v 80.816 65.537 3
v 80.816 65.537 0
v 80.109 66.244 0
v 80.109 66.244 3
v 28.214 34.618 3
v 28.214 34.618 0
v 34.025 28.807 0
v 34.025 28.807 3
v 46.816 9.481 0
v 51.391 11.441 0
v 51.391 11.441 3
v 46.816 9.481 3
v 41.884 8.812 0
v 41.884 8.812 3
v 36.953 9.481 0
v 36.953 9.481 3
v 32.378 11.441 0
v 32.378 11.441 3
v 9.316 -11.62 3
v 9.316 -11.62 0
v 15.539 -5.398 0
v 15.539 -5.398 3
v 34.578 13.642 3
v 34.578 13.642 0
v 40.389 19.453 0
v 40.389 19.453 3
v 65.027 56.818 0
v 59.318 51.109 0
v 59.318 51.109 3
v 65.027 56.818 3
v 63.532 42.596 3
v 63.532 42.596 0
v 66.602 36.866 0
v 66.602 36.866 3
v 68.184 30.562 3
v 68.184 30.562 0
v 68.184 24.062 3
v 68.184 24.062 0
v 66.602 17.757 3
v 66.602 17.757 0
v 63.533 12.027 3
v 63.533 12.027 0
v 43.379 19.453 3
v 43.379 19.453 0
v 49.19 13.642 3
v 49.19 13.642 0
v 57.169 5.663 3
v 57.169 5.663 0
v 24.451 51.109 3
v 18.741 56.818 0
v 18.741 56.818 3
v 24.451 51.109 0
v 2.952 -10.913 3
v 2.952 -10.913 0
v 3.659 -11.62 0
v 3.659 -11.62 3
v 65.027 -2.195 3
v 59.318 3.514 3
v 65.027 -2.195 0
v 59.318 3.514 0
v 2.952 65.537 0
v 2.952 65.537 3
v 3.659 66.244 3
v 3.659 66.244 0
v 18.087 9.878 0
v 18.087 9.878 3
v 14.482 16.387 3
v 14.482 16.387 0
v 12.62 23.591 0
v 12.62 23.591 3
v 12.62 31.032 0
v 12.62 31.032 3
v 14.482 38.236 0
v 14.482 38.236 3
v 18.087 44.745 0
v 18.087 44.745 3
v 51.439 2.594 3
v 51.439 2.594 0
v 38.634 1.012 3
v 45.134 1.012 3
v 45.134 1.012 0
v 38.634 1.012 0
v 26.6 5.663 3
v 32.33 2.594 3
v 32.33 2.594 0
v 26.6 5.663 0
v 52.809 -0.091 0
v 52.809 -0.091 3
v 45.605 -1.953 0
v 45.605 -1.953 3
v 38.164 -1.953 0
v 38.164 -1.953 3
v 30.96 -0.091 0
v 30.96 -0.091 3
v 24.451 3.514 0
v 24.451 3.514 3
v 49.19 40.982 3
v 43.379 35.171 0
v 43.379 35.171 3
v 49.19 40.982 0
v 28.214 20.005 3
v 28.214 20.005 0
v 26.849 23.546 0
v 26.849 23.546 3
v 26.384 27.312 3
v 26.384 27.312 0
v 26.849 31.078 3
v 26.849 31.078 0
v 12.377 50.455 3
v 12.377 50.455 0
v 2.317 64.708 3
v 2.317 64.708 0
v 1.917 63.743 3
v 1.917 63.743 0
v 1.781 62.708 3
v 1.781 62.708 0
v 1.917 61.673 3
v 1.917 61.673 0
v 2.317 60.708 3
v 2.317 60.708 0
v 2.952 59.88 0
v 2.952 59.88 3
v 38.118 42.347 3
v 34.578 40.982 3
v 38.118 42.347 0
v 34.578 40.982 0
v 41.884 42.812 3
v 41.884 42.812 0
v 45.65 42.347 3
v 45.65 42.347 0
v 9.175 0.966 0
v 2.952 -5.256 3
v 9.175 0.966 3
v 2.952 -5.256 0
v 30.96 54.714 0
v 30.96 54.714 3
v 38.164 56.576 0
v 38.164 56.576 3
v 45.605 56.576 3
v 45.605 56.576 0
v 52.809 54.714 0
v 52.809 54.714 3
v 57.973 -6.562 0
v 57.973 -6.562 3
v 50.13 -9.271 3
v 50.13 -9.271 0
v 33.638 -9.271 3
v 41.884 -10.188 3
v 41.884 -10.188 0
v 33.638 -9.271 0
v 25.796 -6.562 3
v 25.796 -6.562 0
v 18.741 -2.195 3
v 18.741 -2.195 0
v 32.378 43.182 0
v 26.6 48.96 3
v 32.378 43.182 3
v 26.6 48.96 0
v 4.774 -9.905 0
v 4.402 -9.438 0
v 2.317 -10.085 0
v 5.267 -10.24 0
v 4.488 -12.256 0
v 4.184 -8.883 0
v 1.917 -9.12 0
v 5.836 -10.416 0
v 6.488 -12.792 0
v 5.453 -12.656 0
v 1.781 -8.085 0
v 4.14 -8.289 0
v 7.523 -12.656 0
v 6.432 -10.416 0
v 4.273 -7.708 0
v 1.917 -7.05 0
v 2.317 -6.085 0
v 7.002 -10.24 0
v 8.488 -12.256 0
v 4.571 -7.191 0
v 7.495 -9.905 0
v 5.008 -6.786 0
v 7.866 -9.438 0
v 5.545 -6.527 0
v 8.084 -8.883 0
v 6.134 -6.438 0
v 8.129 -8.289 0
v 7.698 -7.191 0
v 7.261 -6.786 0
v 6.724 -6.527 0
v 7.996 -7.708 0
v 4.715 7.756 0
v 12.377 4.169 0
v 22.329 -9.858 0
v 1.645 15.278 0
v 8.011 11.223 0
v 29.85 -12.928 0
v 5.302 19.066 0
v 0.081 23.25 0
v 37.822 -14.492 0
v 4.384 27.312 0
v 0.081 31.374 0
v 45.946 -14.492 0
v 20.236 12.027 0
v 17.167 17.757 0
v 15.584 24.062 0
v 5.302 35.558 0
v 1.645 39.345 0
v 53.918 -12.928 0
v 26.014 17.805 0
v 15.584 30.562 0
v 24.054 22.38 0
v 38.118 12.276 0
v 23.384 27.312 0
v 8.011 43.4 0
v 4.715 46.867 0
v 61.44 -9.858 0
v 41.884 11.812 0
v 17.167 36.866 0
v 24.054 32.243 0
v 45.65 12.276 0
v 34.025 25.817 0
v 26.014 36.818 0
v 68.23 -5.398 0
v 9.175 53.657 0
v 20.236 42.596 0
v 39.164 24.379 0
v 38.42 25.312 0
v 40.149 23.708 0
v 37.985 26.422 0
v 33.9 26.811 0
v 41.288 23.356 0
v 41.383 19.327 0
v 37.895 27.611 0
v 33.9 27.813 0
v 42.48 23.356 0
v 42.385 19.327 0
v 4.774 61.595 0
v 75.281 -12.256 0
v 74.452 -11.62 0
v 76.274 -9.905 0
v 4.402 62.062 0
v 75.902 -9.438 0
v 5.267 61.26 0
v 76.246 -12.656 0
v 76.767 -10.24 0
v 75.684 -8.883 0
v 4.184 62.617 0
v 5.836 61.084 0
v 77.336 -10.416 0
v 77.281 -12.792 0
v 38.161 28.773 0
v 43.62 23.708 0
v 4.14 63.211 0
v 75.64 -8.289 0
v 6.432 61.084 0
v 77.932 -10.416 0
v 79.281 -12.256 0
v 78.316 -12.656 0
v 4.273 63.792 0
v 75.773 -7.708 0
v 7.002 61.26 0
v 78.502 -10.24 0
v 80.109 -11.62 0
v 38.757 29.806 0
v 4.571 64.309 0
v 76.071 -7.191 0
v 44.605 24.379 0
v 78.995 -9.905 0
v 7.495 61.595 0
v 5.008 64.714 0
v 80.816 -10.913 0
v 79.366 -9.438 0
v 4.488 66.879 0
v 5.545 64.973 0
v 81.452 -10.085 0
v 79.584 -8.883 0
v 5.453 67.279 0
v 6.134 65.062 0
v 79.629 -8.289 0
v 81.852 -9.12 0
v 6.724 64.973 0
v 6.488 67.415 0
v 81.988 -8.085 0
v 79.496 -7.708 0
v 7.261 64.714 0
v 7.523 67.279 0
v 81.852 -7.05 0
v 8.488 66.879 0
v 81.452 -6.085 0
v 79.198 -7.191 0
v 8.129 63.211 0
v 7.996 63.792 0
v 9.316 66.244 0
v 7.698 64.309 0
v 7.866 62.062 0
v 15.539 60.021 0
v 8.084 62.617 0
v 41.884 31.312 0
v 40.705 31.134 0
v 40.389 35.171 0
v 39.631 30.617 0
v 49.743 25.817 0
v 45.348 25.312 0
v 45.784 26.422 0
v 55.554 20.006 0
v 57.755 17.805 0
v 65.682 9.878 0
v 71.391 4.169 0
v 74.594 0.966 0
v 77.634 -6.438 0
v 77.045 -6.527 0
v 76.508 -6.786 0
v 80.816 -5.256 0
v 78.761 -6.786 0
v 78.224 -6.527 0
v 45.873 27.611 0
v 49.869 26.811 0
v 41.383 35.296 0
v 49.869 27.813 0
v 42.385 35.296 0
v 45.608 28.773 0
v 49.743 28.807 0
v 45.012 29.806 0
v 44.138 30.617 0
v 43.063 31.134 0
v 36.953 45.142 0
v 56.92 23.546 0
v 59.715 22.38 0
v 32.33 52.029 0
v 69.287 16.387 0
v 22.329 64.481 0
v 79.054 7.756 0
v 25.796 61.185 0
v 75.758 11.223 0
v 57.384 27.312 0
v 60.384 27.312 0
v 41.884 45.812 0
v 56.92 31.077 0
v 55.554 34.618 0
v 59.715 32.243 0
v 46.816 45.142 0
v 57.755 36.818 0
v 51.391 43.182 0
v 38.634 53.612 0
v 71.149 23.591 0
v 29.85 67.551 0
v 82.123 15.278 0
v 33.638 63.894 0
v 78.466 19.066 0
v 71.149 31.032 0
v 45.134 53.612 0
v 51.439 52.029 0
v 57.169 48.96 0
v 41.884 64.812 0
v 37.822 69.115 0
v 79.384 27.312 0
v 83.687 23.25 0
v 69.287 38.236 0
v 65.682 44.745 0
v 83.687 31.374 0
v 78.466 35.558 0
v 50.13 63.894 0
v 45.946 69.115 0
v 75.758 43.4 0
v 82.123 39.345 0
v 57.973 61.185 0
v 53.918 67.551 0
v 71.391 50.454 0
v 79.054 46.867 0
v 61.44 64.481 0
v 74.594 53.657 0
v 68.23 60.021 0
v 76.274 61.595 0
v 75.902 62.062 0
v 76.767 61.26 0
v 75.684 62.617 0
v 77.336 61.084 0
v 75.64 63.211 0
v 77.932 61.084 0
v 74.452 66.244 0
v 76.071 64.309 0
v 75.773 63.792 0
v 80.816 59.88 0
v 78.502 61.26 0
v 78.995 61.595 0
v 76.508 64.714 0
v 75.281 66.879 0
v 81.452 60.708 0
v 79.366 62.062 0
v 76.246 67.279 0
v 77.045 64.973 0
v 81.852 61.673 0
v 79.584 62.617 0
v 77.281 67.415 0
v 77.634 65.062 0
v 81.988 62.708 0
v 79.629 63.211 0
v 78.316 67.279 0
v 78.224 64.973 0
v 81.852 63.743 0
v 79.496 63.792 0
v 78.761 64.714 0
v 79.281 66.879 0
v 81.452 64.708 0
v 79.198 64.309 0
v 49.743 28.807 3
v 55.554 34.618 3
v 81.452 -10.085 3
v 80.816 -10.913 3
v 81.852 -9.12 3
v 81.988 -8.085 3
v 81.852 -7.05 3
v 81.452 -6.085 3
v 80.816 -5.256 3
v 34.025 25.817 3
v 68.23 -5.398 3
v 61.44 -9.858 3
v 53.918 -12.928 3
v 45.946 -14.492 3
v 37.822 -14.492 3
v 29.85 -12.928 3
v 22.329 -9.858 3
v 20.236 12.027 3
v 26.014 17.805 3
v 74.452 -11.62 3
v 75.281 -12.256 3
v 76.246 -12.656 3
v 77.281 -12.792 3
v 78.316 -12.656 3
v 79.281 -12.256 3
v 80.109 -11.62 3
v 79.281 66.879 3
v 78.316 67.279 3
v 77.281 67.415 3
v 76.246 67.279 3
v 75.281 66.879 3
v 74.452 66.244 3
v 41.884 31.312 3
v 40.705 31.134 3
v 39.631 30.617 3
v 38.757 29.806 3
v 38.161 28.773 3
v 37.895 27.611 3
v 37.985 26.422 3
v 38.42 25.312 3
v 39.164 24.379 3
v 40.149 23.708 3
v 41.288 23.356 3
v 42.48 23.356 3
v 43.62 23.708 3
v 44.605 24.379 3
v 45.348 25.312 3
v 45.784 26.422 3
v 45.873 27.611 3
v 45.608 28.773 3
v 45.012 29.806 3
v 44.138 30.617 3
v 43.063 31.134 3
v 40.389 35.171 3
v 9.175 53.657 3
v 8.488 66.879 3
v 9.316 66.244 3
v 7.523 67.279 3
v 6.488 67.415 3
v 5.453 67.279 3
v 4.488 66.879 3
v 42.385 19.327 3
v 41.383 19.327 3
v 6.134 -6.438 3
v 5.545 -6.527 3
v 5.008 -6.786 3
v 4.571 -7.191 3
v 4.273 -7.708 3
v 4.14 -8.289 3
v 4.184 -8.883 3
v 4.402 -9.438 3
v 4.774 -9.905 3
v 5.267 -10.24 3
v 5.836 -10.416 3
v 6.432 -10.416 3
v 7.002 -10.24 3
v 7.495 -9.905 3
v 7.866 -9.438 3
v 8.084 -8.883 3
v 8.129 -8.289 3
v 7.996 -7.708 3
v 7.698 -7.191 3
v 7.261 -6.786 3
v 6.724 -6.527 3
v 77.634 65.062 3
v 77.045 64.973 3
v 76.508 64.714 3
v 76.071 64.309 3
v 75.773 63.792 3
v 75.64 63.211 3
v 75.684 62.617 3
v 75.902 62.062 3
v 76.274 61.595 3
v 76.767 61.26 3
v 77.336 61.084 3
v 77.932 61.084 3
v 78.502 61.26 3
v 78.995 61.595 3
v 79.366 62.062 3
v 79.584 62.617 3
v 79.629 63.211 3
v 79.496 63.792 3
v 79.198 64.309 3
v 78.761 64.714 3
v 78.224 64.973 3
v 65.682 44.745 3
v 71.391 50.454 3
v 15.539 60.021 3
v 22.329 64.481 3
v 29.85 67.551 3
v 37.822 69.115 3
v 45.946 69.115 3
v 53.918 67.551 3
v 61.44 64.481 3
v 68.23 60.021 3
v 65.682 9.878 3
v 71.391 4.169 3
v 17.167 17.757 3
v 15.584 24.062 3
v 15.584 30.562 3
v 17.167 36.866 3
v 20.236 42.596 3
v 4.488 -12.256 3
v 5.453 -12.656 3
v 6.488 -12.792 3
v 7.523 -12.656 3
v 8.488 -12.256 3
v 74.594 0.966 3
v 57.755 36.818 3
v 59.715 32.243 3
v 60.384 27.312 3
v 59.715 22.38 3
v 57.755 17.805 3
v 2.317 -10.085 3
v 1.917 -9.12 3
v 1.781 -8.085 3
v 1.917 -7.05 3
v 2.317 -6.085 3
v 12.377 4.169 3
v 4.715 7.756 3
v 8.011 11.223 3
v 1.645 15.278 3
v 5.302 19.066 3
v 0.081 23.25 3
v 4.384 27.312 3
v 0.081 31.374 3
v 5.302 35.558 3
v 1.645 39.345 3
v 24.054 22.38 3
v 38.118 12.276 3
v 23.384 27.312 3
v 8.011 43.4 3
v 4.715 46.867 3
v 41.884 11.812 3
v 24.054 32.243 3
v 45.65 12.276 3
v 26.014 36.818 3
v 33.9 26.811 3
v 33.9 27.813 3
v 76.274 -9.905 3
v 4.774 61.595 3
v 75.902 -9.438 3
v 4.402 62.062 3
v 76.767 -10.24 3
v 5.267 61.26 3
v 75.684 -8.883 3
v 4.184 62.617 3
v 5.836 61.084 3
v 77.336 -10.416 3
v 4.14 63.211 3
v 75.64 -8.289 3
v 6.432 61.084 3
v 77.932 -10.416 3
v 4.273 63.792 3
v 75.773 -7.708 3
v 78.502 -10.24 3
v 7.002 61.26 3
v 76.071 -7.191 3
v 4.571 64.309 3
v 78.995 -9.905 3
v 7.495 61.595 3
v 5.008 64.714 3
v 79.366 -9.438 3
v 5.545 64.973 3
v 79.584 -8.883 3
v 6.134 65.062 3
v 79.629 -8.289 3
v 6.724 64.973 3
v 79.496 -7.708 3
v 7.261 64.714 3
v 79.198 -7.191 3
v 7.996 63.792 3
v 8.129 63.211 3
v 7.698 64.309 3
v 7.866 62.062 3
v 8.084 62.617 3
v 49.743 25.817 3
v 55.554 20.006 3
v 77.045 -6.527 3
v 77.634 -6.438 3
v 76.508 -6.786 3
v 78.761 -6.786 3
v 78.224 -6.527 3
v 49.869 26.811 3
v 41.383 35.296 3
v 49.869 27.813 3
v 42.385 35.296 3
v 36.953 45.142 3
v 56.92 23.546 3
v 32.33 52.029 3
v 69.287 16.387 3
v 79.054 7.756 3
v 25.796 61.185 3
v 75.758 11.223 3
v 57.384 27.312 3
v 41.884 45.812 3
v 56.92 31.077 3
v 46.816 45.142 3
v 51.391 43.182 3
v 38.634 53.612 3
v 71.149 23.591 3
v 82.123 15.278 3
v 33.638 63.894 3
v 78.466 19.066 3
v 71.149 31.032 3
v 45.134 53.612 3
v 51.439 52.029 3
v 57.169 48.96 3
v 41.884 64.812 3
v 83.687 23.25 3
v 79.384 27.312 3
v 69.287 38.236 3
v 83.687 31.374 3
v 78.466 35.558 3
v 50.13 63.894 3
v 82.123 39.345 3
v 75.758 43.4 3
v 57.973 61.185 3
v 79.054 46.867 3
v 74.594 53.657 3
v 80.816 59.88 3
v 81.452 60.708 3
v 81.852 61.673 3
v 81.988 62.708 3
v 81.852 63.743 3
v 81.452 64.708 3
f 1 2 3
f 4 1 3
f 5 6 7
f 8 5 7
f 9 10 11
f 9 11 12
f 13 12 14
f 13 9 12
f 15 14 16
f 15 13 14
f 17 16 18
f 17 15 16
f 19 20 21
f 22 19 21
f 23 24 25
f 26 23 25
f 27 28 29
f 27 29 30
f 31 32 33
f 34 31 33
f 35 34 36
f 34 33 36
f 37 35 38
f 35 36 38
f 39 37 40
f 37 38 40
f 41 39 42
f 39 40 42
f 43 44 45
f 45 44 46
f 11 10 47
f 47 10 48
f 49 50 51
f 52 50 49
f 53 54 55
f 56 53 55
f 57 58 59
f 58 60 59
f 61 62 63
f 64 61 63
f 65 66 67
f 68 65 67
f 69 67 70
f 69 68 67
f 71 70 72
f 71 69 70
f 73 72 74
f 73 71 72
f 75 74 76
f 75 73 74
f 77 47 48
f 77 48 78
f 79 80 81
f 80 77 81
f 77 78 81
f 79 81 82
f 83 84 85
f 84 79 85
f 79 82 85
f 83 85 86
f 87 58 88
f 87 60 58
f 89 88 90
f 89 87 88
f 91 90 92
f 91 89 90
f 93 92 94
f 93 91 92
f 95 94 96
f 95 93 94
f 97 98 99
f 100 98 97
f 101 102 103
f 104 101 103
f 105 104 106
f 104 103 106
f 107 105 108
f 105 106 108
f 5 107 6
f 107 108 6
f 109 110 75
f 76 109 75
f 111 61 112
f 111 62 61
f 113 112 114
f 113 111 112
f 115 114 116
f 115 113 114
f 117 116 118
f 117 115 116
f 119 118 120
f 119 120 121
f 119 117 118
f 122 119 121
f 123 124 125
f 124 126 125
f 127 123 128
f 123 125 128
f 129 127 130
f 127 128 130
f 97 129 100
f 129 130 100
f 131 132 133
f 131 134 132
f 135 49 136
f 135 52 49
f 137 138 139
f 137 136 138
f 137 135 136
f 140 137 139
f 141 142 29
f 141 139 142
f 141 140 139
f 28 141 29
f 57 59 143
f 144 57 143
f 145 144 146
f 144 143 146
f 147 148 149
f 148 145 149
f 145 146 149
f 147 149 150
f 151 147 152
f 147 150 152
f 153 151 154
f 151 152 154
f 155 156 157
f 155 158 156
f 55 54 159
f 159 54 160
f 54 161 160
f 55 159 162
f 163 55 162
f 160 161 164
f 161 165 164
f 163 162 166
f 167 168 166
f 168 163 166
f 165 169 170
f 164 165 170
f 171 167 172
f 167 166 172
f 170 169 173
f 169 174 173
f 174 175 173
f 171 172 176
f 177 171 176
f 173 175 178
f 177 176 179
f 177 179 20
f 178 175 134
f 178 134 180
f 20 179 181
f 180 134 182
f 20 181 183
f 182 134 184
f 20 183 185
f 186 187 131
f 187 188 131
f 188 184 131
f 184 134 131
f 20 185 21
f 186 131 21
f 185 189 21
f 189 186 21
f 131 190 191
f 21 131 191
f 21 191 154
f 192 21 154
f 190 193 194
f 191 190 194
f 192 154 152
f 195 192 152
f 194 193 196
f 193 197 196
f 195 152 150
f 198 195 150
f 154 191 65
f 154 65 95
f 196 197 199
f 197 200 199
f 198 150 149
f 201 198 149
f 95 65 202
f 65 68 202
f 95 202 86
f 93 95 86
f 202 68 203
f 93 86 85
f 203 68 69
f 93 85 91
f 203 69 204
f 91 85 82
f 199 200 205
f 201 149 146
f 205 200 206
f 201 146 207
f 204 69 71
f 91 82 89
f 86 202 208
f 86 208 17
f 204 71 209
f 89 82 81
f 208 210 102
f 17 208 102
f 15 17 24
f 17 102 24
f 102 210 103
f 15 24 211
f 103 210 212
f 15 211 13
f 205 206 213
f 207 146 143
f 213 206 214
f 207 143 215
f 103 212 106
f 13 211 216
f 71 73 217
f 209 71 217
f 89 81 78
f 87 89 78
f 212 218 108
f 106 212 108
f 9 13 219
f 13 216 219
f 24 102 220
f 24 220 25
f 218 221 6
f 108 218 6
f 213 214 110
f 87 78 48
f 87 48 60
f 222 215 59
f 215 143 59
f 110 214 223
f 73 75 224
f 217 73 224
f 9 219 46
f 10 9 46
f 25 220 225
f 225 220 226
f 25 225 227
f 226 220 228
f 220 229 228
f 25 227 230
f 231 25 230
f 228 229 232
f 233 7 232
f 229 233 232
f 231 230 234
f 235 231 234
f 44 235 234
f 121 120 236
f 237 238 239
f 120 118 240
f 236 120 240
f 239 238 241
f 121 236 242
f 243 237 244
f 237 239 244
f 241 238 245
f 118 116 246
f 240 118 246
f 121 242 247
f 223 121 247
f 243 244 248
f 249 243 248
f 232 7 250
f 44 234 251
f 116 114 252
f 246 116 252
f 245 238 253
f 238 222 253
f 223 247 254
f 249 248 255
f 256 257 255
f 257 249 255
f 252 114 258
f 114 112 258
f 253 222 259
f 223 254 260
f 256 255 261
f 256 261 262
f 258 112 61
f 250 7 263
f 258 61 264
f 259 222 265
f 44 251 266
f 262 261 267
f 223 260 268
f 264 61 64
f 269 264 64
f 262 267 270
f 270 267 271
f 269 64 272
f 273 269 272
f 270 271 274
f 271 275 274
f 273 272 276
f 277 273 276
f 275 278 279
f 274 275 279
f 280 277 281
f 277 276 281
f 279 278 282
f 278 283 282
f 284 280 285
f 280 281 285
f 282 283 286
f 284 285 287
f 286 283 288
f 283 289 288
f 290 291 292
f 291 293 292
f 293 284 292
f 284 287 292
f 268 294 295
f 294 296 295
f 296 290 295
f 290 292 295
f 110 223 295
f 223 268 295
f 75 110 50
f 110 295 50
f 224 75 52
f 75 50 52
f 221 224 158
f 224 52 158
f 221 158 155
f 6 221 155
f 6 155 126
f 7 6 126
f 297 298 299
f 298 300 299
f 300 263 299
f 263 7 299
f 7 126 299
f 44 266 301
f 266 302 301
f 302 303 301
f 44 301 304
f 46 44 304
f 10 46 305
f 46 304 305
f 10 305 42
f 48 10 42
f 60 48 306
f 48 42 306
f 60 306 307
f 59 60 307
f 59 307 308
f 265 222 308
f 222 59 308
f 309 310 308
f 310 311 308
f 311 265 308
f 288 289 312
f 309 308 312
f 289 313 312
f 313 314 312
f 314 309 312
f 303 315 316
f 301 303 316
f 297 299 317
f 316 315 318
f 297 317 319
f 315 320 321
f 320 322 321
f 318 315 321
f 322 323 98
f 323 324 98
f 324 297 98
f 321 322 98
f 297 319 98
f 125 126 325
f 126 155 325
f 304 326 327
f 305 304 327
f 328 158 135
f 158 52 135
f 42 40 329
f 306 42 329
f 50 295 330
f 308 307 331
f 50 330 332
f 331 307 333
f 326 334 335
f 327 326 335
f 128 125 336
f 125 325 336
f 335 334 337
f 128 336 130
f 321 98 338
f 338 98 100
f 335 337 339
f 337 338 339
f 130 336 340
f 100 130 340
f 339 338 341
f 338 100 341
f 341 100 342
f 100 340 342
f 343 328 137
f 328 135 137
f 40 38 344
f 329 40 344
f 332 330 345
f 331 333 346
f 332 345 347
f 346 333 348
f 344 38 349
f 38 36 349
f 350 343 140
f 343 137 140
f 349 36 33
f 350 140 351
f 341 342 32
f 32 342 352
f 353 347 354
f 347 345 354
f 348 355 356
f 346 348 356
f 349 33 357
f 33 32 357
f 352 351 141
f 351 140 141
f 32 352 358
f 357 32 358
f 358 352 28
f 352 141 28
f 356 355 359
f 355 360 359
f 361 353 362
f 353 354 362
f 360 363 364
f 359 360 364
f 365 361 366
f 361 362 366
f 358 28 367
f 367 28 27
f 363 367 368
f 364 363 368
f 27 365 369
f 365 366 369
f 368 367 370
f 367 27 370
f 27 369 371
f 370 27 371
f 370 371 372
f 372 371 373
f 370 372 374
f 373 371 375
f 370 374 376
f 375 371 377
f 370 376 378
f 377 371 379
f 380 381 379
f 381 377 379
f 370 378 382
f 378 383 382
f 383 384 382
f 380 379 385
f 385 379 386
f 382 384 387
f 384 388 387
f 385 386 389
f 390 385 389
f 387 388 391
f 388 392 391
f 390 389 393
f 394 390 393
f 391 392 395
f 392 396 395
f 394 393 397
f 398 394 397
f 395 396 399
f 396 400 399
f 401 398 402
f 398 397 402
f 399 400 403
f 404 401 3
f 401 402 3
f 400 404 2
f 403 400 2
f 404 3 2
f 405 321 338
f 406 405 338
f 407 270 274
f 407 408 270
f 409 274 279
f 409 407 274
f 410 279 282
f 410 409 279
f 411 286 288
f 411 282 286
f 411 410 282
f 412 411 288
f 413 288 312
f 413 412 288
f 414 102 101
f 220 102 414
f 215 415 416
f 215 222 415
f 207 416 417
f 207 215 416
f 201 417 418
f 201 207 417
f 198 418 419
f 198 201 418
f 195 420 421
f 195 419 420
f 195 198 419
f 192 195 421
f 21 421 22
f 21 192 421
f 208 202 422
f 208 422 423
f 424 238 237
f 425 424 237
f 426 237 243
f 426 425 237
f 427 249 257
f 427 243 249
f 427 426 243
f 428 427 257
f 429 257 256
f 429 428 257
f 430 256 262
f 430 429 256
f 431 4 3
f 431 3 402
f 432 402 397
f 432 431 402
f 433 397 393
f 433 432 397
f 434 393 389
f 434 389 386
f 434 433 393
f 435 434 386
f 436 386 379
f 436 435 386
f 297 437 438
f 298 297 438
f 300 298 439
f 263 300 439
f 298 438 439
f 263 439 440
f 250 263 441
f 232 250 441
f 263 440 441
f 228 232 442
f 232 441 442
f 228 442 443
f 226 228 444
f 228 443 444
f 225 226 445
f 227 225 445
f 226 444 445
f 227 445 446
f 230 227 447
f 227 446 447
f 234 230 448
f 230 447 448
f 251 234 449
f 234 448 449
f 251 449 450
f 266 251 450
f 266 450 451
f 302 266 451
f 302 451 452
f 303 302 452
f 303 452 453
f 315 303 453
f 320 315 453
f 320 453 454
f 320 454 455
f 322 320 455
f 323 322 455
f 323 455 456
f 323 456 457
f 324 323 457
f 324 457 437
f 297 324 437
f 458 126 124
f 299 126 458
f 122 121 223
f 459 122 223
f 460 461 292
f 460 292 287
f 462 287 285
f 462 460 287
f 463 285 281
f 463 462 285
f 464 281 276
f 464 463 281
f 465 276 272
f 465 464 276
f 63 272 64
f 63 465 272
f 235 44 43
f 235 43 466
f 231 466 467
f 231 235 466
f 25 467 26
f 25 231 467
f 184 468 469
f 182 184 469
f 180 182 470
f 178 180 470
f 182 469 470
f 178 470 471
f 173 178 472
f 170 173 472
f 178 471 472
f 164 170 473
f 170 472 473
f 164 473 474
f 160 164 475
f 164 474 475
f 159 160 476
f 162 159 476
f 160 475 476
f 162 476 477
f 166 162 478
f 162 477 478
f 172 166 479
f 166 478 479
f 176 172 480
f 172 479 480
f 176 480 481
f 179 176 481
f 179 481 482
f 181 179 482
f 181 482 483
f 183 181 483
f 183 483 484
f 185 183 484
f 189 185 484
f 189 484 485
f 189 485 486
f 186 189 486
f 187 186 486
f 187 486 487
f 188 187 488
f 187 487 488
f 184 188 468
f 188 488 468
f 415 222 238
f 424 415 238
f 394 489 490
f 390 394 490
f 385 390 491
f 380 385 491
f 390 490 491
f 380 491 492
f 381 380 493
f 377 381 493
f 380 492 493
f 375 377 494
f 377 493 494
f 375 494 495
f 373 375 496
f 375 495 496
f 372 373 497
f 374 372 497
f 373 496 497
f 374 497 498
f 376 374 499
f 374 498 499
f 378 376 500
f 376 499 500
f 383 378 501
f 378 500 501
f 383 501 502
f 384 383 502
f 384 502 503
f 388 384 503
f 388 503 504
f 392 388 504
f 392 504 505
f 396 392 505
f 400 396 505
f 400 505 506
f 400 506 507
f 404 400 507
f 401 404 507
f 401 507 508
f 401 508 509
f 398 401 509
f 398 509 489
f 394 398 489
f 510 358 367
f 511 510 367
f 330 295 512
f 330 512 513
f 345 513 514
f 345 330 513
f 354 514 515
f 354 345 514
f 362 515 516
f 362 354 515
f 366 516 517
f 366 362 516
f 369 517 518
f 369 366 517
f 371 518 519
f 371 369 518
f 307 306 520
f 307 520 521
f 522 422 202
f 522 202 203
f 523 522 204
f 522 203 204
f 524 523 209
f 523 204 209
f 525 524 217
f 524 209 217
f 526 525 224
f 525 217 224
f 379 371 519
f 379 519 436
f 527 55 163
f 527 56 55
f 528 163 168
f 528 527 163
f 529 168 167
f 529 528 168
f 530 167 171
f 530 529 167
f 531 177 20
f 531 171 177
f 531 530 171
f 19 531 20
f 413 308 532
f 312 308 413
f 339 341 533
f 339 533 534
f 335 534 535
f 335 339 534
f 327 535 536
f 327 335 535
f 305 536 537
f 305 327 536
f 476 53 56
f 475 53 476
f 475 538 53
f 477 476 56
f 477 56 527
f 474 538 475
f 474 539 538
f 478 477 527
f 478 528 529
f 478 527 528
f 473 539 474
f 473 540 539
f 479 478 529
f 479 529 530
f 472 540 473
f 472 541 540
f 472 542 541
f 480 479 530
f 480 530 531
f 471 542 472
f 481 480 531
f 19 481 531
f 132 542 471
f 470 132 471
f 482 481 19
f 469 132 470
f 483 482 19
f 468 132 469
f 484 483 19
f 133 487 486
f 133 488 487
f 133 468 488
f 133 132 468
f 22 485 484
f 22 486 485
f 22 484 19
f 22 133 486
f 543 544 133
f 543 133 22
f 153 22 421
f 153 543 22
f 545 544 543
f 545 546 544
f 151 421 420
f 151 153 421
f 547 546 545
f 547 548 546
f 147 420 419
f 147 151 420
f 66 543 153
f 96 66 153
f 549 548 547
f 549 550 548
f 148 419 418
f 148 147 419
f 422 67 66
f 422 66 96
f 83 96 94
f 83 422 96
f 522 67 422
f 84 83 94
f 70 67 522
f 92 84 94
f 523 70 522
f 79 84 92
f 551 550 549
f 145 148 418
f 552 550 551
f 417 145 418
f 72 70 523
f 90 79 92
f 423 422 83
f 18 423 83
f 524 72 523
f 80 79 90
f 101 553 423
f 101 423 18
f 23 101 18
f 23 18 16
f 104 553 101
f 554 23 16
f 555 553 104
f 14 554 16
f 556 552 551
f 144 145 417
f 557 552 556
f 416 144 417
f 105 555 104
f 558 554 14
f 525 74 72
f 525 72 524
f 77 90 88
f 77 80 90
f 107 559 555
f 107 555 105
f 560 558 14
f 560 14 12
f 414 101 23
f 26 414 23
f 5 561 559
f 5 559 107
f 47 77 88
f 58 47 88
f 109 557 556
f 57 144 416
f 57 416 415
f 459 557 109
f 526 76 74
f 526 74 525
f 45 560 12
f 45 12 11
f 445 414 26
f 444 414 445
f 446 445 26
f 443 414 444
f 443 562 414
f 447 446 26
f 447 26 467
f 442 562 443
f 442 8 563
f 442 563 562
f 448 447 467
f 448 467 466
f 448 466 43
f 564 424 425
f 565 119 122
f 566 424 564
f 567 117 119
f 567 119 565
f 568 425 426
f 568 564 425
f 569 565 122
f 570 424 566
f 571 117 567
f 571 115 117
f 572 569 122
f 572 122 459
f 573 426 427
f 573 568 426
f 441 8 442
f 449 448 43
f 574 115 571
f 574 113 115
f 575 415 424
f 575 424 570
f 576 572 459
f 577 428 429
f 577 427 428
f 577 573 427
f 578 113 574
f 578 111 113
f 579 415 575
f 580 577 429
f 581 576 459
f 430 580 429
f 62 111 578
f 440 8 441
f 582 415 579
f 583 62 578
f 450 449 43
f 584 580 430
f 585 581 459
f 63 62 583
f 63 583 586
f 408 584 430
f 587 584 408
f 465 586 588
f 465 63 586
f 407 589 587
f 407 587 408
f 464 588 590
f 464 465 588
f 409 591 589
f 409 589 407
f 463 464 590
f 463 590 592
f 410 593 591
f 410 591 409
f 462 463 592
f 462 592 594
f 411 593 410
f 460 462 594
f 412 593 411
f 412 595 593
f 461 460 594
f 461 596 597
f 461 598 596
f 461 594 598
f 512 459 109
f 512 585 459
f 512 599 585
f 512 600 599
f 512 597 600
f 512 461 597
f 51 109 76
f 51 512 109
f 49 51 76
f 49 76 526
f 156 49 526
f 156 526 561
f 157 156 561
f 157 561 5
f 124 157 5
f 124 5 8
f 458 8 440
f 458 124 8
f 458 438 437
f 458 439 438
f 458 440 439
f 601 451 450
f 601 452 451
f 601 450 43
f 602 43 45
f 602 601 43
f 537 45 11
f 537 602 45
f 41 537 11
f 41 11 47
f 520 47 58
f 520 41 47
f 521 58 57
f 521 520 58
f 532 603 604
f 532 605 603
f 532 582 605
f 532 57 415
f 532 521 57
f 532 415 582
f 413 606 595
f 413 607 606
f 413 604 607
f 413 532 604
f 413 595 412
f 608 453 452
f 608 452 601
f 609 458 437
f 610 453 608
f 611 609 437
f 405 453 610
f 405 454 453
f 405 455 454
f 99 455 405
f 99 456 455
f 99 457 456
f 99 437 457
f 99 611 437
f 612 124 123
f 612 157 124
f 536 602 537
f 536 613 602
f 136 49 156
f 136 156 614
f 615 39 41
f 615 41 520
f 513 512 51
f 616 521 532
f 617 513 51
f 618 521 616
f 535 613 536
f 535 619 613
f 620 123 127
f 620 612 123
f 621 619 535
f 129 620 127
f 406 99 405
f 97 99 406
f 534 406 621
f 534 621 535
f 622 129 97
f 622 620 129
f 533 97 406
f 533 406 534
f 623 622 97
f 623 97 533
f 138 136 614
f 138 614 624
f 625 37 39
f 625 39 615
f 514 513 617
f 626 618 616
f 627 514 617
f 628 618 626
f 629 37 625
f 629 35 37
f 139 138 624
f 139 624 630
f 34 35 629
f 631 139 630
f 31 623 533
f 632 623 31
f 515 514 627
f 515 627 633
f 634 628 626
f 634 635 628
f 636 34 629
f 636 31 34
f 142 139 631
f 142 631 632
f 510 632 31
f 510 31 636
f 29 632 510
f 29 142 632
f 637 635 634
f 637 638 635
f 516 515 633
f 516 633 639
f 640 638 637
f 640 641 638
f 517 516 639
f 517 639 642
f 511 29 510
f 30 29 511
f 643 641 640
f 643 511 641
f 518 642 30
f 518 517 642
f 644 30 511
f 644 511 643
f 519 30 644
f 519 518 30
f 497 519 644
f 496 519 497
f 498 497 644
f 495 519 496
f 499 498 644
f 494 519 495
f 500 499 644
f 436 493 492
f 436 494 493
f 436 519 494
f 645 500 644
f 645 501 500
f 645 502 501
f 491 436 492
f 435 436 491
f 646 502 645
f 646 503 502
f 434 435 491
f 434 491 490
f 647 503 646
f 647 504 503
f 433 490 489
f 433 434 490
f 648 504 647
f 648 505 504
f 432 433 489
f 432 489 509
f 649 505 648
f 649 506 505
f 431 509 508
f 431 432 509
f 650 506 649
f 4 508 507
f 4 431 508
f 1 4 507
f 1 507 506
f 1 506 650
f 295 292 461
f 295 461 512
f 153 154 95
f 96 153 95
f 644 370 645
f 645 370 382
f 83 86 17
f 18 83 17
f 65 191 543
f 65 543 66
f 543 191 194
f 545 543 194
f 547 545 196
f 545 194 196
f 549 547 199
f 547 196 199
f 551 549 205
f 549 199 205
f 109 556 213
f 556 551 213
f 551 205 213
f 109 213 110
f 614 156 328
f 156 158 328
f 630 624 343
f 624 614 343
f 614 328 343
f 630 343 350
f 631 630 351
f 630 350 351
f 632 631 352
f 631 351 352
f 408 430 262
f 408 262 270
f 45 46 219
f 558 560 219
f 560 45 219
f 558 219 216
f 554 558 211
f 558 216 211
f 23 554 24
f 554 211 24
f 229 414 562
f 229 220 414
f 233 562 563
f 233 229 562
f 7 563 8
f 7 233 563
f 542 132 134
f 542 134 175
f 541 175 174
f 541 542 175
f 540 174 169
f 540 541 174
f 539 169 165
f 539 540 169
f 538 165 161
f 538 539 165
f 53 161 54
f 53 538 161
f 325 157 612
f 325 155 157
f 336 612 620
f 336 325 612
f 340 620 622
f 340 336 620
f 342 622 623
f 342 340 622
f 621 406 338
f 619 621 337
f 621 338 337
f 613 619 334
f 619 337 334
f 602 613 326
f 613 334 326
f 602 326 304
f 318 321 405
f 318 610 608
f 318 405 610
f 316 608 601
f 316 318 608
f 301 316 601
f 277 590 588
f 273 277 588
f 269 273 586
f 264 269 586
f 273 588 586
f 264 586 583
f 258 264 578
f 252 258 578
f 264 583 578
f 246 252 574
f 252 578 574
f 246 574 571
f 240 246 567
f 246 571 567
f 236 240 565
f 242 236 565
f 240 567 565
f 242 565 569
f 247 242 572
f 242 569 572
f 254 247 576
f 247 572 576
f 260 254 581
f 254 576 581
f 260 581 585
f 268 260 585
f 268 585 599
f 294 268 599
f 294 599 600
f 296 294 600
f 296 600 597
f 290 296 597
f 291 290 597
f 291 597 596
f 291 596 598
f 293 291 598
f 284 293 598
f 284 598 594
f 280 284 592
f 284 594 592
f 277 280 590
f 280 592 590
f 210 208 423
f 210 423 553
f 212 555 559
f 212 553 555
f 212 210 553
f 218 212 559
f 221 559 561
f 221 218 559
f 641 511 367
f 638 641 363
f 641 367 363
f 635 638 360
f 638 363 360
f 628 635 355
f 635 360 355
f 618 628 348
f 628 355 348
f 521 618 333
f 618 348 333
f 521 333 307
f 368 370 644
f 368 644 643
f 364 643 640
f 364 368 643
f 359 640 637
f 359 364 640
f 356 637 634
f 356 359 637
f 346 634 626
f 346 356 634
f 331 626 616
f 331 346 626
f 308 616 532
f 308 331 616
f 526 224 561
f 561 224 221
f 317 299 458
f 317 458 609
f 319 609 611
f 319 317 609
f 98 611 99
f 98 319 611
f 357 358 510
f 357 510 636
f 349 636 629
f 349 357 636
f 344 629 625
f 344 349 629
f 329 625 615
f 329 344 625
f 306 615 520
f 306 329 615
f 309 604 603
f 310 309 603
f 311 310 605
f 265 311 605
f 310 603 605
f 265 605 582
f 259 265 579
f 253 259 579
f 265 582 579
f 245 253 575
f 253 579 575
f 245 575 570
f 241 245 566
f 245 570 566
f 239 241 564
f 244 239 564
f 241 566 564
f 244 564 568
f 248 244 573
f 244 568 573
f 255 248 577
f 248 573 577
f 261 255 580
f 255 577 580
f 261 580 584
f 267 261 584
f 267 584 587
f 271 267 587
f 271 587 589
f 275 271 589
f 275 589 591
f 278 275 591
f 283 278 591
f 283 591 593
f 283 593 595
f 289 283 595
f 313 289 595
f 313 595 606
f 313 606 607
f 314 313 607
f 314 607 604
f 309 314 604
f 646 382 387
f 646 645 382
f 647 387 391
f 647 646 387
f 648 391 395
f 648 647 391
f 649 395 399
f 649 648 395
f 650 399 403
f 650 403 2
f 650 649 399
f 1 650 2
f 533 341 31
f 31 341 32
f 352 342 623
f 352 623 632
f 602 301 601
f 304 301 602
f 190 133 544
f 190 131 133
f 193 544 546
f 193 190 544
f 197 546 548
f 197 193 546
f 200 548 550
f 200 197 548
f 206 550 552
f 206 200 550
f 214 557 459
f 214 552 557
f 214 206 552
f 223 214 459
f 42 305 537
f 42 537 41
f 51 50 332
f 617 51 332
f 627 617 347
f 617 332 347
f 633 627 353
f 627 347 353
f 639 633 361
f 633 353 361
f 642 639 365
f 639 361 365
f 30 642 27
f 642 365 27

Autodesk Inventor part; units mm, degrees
ref_plane "YZ Plane" through (0, 0, 0) normal (1, 0, 0) x (0, 1, 0)
ref_plane "XZ Plane" through (0, 0, 0) normal (0, 1, 0) x (-1, 0, 0)
ref_plane "XY Plane" through (0, 0, 0) normal (0, 0, 1) x (1, 0, 0)
sketch "Szkic1" plane through (0, 0, 0) normal (0, 0, 1) x (1, 0, 0)
  circle A0 centre (41.8843, 27.3116) radius 37.5
  circle A1 centre (41.8843, 27.3116) radius 42
  circle A2 centre (41.8843, 27.3116) radius 29.5
  circle A3 centre (41.8843, 27.3116) radius 26.5
  circle A4 centre (41.8843, 27.3116) radius 18.5
  circle A5 centre (41.8843, 27.3116) radius 15.5
  circle A6 centre (41.8843, 27.3116) radius 8
  line L0 (0.1239, 62.7081) -> (6.4879, 69.072)
  line L1 (83.6448, 62.7081) -> (77.2808, 69.072)
  line L2 (77.2808, -14.4488) -> (83.6448, -8.0848)
  line L3 (0.1239, -8.0848) -> (6.4879, -14.4488)
  line L4 (0.1239, 62.7081) -> (77.2808, -14.4488)
  line L5 (6.4879, 69.072) -> (83.6448, -8.0848)
  line L6 (0.1239, -8.0848) -> (77.2808, 69.072)
  line L7 (6.4879, -14.4488) -> (83.6448, 62.7081)
  point P0 (0, 0)
  point P1 (0, 0)
  point P2 (6.1343, 63.0616)
  point P3 (77.6343, 63.0616)
  point P4 (77.6343, -8.4384)
  point P5 (6.1343, -8.4384)
  dimension "d0" = 75
  dimension "d1" = 35.75
  dimension "d2" = 35.75
  dimension "d3" = 35.75
  dimension "d4" = 35.75
  dimension "d5" = 35.75
  dimension "d6" = 35.75
  dimension "d7" = 35.75
  dimension "d8" = 35.75
  dimension "d9" = 4.5
  dimension "d20" = 8
  dimension "d21" = 3
  dimension "d22" = 8
  dimension "d23" = 3
  dimension "d24" = 16
  dimension "d33" = 4
  dimension "d34" = 4
  dimension "d35" = 4
  dimension "d36" = 4
extrude "Wyciągnięcie proste1" add sketch "Szkic1" along normal blind 3 contours A0 L7 A1 L5 | L7 A2 L6 A0 | A0 L6 A1 L7 | L5 A1 L4 A0 | A0 L4 A2 L5 | A0 L5 A1 L6 | L7 A3 L6 A2 | A2 L5 A3 L7 | A1 L6 L1 L7 | L4 A1 L7 A0 | A2 L4 A3 L5 | L5 L2 L4 A1 | L5 A2 L4 A0 | A0 L4 A1 L5 | L6 A3 L5 A2 | L7 A4 L6 A3 | L7 A1 L6 A0 | A0 L6 A2 L7 | A2 L7 A3 L4 | A3 L4 A4 L5 | A0 L6 A1 L4 | A1 L4 L0 L5 | L5 A3 L4 A2 | L7 A5 L6 A4 | A4 L5 A5 L7 | L7 L3 L6 A1 | A2 L6 A3 L7 | A4 L4 A5 L5 | L4 A3 L6 A2 | L5 A4 L4 A3 | L6 A5 L5 A4 | L7 A6 L6 A5 | A3 L6 A4 L7 | A4 L7 A5 L4 | A5 L4 A6 L5 | L5 A5 L4 A4 | L7 L5 L6 A6 | A6 L5 L7 | A4 L6 A5 L7 | A6 L4 L7 L5 | L4 A5 L6 A4 | L5 A6 L4 A5 | L6 L5 A6 | L7 L4 L6 L5 | A5 L6 A6 L7 | A6 L7 L4 | L5 L6 L4 A6 | L7 A6 L6 L4 | L4 L6 A6
hole "Otwór1" at (6.1343, -8.4384, 0) at (77.6343, -8.4384, 0) at (77.6343, 63.0616, 0) at (6.1343, 63.0616, 0) direction (0, 0, 1) diameter 4 end through all
fillet "Zaokrąglenie1" radius 4 8 edges at (6.4879, -14.4488, 1.5) (0.1239, -8.0848, 1.5) (77.2808, -14.4488, 1.5) (83.6448, -8.0848, 1.5) (83.6448, 62.7081, 1.5) (77.2808, 69.072, 1.5) (0.1239, 62.7081, 1.5) (6.4879, 69.072, 1.5)
hole "Otwór2" at (41.8843, 27.3116, 0) direction (0, 0, 1) diameter 8 depth 8 tip angle 118
equation "\"d2\" = d1"
equation "\"d3\" = d1"
equation "\"d4\" = d1"
equation "\"d5\" = d1"
equation "\"d6\" = d1"
equation "\"d7\" = d1"
equation "\"d8\" = d1"
equation "\"d17\" = d16"
equation "\"d18\" = d16"
equation "\"d19\" = d16"
equation "\"d16\" = 4.5"
properties part number "3DP_PLA_Controller_Case_Fan_Grill"
